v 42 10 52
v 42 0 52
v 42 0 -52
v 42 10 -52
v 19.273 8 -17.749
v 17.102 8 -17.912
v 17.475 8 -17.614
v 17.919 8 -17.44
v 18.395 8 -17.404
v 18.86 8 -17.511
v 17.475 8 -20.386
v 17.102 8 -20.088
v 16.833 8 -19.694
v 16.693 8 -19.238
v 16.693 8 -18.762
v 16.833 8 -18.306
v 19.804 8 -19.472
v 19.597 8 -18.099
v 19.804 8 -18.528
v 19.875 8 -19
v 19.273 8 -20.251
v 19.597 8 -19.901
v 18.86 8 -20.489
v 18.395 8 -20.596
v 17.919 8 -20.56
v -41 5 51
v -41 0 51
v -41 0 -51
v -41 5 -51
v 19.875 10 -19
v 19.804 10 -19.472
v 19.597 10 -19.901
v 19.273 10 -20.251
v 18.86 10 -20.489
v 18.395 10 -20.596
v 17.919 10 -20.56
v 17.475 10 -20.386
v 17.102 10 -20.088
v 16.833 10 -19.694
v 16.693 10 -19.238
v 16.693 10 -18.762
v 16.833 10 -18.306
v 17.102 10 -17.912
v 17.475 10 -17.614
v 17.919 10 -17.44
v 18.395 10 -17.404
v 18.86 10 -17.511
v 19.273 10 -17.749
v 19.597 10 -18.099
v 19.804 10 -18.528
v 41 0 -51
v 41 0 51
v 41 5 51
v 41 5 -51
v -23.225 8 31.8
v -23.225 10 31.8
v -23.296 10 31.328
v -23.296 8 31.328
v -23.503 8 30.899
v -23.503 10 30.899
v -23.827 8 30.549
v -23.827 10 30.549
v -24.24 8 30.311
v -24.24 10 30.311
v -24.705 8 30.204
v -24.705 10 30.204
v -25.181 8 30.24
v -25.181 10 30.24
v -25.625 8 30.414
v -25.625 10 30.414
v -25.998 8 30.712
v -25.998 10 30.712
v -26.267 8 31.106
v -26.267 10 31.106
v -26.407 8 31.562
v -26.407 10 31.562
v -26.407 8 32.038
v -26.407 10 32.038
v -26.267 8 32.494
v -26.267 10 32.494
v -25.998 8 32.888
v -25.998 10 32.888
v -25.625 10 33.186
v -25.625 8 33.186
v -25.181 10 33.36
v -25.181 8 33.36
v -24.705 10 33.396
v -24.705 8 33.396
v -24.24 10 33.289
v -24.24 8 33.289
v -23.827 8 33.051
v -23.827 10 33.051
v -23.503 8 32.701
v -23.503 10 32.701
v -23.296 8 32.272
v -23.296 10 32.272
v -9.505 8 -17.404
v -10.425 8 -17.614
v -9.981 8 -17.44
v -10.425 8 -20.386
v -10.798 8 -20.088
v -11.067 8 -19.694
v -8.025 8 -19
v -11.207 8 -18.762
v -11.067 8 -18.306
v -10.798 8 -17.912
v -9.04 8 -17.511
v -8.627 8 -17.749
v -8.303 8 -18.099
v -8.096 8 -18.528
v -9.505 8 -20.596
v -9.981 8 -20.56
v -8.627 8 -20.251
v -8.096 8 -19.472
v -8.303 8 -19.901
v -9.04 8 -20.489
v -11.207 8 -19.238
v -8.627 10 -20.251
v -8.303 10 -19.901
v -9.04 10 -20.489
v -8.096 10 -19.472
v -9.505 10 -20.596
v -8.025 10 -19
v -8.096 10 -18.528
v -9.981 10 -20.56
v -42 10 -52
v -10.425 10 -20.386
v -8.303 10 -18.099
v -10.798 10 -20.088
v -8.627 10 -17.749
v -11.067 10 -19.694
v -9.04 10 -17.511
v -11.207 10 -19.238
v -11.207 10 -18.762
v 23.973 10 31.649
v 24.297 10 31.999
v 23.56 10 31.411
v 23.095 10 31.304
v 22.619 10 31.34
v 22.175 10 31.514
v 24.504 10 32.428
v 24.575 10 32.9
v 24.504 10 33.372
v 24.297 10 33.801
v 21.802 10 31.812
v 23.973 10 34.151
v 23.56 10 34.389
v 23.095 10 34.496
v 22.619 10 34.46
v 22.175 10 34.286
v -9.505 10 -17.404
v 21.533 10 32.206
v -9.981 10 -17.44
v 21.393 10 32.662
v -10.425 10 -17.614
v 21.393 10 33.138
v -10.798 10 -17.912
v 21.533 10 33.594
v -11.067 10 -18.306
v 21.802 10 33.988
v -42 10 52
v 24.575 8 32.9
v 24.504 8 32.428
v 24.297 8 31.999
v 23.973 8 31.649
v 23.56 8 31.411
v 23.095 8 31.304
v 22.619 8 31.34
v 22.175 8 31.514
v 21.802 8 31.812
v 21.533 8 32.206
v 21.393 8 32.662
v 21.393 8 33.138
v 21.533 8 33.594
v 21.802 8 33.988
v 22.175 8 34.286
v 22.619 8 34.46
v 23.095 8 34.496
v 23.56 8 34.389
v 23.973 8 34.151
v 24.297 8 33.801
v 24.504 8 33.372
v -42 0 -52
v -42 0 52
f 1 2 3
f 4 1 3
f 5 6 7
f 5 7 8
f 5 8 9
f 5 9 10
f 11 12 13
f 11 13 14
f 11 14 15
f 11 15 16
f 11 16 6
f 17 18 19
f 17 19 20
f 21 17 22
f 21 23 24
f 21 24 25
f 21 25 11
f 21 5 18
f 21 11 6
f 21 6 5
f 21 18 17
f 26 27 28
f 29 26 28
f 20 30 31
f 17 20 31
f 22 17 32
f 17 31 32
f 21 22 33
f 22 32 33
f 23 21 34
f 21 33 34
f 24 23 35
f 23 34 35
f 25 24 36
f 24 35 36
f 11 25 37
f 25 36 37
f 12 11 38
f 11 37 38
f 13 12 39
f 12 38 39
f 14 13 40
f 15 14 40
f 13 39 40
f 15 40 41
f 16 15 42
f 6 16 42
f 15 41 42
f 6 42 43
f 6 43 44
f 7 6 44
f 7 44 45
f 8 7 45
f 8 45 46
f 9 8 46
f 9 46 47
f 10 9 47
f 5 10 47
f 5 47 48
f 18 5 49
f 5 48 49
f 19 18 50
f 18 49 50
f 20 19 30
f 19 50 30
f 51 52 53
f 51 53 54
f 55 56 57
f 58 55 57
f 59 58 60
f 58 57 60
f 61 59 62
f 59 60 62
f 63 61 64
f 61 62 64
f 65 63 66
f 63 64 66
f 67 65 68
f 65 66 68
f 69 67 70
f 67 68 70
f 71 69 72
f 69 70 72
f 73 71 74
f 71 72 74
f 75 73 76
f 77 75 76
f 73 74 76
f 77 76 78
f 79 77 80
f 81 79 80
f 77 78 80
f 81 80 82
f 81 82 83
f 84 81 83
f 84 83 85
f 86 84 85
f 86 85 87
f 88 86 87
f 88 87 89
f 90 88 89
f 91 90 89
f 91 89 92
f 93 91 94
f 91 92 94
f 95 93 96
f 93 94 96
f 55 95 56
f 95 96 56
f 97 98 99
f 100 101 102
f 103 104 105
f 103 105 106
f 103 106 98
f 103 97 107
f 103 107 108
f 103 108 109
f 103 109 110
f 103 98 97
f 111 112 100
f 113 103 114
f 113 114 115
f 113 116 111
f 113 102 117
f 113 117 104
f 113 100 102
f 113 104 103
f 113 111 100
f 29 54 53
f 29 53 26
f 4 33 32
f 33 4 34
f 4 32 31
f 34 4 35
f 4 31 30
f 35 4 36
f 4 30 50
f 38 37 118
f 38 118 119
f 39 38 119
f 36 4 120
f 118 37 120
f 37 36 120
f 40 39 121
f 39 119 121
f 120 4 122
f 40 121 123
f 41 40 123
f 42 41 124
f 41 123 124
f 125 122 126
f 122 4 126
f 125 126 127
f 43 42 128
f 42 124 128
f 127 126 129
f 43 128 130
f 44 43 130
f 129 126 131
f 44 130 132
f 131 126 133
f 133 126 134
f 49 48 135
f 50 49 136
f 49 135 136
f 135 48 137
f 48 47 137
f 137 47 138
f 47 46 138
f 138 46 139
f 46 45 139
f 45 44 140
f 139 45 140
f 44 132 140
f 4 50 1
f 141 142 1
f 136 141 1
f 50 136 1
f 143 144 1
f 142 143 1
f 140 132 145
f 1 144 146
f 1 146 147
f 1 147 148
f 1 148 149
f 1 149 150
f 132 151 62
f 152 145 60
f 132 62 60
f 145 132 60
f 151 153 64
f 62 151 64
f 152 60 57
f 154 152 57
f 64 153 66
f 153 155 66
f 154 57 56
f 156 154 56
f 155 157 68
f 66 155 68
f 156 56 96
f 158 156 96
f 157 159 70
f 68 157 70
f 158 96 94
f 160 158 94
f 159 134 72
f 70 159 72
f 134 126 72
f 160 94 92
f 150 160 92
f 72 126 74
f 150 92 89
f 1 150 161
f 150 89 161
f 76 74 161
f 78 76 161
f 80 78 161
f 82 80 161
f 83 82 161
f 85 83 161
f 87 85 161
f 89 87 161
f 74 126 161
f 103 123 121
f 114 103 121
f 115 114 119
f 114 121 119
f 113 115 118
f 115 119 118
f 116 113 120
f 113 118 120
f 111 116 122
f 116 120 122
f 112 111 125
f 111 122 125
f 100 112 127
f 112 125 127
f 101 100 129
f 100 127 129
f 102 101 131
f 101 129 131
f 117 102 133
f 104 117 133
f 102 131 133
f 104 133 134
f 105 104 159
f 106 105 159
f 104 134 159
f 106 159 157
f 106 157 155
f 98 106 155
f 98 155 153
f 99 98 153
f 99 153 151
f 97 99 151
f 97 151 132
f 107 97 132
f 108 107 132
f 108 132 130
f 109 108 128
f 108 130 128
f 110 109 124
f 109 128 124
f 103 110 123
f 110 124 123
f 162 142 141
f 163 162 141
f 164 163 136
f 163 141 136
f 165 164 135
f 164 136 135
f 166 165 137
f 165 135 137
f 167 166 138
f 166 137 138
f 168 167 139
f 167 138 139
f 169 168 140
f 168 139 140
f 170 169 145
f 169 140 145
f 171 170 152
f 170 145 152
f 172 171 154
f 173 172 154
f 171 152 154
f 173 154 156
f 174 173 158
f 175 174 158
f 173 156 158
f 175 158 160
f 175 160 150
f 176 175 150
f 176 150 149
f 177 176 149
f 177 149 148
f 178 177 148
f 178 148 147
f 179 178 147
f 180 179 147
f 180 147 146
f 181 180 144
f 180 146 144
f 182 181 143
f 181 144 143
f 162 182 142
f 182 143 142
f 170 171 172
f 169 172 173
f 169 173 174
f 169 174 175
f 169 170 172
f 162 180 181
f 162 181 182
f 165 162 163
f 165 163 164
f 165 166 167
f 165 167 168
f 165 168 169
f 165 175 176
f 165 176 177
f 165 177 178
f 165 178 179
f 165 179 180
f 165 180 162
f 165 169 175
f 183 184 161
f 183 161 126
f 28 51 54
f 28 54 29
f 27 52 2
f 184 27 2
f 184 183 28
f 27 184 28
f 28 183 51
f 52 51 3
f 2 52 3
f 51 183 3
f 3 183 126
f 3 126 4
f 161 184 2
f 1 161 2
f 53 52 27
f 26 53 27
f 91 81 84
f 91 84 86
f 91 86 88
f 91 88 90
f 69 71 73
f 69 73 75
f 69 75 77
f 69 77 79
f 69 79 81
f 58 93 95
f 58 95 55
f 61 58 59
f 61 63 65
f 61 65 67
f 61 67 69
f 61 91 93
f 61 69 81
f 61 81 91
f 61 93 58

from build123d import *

# Parameters (mm, degrees)
SKETCH1_W           = 84
SKETCH1_H           = 104
BOSS_EXTRUDE1_DEPTH = 20
SKETCH2_W           = 82
SKETCH2_H           = 102
CUT_EXTRUDE1_DEPTH  = 5
SKETCH3_W           = 74
SKETCH3_H           = 94
CUT_EXTRUDE2_DEPTH  = 10
SKETCH4_W           = 37.72
SKETCH4_H           = 10
CUT_EXTRUDE4_DEPTH  = 6
SKETCH6_W           = 15
SKETCH6_H           = 10
SKETCH6_W_2         = 10
CUT_EXTRUDE6_DEPTH  = 10
SKETCH7_R           = 1.6
CUT_EXTRUDE7_DEPTH  = 2
SKETCH9_W           = 104
SKETCH9_H           = 10
CUT_EXTRUDE8_DEPTH  = 85


with BuildPart() as part:
    # Sketch1 → Boss-Extrude1 (new body)
    with BuildSketch(Plane(origin=(0, 0, 0), x_dir=(1, 0, 0), z_dir=(0, 1, 0))):
        Rectangle(SKETCH1_W, SKETCH1_H)
    extrude(amount=BOSS_EXTRUDE1_DEPTH)

    # Sketch2 → Cut-Extrude1 (cut)
    with BuildSketch(Plane(origin=(0, 0, 0), x_dir=(-1, 0, 0), z_dir=(0, -1, 0))):
        Rectangle(SKETCH2_W, SKETCH2_H)
    extrude(amount=-CUT_EXTRUDE1_DEPTH, mode=Mode.SUBTRACT)

    # Sketch3 → Cut-Extrude2 (cut)
    with BuildSketch(Plane(origin=(0, 20, 0), x_dir=(1, 0, 0), z_dir=(0, 1, 0))):
        Rectangle(SKETCH3_W, SKETCH3_H)
    extrude(amount=-CUT_EXTRUDE2_DEPTH, mode=Mode.SUBTRACT)

    # Sketch4 → Cut-Extrude4 (cut, through all)
    with BuildSketch(Plane.XY.offset(-47)):
        with Locations((0, 15)):
            Rectangle(SKETCH4_W, SKETCH4_H)
    extrude(amount=-CUT_EXTRUDE4_DEPTH, mode=Mode.SUBTRACT)

    # Sketch6 → Cut-Extrude6 (cut)
    with BuildSketch(Plane(origin=(0, 0, 47), x_dir=(-1, 0, 0), z_dir=(0, 0, -1))):
        with Locations((11.15, 15)):
            Rectangle(SKETCH6_W, SKETCH6_H)
        with Locations((-17.35, 15)):
            Rectangle(SKETCH6_W_2, SKETCH6_H)
    extrude(amount=-CUT_EXTRUDE6_DEPTH, mode=Mode.SUBTRACT)

    # Sketch7 → Cut-Extrude7 (cut)
    with BuildSketch(Plane(origin=(0, 10, 0), x_dir=(1, 0, 0), z_dir=(0, 1, 0))):
        with Locations((18.275, 19)):
            Circle(SKETCH7_R)
        with Locations((-24.825, -31.8)):
            Circle(SKETCH7_R)
        with Locations((22.975, -32.9)):
            Circle(SKETCH7_R)
        with Locations((-9.625, 19)):
            Circle(SKETCH7_R)
    extrude(amount=-CUT_EXTRUDE7_DEPTH, mode=Mode.SUBTRACT)

    # Sketch9 → Cut-Extrude8 (cut, through all)
    with BuildSketch(Plane.ZY.offset(42)):
        with Locations((0, 15)):
            Rectangle(SKETCH9_W, SKETCH9_H)
    extrude(amount=-CUT_EXTRUDE8_DEPTH, mode=Mode.SUBTRACT)


solid = part.part
